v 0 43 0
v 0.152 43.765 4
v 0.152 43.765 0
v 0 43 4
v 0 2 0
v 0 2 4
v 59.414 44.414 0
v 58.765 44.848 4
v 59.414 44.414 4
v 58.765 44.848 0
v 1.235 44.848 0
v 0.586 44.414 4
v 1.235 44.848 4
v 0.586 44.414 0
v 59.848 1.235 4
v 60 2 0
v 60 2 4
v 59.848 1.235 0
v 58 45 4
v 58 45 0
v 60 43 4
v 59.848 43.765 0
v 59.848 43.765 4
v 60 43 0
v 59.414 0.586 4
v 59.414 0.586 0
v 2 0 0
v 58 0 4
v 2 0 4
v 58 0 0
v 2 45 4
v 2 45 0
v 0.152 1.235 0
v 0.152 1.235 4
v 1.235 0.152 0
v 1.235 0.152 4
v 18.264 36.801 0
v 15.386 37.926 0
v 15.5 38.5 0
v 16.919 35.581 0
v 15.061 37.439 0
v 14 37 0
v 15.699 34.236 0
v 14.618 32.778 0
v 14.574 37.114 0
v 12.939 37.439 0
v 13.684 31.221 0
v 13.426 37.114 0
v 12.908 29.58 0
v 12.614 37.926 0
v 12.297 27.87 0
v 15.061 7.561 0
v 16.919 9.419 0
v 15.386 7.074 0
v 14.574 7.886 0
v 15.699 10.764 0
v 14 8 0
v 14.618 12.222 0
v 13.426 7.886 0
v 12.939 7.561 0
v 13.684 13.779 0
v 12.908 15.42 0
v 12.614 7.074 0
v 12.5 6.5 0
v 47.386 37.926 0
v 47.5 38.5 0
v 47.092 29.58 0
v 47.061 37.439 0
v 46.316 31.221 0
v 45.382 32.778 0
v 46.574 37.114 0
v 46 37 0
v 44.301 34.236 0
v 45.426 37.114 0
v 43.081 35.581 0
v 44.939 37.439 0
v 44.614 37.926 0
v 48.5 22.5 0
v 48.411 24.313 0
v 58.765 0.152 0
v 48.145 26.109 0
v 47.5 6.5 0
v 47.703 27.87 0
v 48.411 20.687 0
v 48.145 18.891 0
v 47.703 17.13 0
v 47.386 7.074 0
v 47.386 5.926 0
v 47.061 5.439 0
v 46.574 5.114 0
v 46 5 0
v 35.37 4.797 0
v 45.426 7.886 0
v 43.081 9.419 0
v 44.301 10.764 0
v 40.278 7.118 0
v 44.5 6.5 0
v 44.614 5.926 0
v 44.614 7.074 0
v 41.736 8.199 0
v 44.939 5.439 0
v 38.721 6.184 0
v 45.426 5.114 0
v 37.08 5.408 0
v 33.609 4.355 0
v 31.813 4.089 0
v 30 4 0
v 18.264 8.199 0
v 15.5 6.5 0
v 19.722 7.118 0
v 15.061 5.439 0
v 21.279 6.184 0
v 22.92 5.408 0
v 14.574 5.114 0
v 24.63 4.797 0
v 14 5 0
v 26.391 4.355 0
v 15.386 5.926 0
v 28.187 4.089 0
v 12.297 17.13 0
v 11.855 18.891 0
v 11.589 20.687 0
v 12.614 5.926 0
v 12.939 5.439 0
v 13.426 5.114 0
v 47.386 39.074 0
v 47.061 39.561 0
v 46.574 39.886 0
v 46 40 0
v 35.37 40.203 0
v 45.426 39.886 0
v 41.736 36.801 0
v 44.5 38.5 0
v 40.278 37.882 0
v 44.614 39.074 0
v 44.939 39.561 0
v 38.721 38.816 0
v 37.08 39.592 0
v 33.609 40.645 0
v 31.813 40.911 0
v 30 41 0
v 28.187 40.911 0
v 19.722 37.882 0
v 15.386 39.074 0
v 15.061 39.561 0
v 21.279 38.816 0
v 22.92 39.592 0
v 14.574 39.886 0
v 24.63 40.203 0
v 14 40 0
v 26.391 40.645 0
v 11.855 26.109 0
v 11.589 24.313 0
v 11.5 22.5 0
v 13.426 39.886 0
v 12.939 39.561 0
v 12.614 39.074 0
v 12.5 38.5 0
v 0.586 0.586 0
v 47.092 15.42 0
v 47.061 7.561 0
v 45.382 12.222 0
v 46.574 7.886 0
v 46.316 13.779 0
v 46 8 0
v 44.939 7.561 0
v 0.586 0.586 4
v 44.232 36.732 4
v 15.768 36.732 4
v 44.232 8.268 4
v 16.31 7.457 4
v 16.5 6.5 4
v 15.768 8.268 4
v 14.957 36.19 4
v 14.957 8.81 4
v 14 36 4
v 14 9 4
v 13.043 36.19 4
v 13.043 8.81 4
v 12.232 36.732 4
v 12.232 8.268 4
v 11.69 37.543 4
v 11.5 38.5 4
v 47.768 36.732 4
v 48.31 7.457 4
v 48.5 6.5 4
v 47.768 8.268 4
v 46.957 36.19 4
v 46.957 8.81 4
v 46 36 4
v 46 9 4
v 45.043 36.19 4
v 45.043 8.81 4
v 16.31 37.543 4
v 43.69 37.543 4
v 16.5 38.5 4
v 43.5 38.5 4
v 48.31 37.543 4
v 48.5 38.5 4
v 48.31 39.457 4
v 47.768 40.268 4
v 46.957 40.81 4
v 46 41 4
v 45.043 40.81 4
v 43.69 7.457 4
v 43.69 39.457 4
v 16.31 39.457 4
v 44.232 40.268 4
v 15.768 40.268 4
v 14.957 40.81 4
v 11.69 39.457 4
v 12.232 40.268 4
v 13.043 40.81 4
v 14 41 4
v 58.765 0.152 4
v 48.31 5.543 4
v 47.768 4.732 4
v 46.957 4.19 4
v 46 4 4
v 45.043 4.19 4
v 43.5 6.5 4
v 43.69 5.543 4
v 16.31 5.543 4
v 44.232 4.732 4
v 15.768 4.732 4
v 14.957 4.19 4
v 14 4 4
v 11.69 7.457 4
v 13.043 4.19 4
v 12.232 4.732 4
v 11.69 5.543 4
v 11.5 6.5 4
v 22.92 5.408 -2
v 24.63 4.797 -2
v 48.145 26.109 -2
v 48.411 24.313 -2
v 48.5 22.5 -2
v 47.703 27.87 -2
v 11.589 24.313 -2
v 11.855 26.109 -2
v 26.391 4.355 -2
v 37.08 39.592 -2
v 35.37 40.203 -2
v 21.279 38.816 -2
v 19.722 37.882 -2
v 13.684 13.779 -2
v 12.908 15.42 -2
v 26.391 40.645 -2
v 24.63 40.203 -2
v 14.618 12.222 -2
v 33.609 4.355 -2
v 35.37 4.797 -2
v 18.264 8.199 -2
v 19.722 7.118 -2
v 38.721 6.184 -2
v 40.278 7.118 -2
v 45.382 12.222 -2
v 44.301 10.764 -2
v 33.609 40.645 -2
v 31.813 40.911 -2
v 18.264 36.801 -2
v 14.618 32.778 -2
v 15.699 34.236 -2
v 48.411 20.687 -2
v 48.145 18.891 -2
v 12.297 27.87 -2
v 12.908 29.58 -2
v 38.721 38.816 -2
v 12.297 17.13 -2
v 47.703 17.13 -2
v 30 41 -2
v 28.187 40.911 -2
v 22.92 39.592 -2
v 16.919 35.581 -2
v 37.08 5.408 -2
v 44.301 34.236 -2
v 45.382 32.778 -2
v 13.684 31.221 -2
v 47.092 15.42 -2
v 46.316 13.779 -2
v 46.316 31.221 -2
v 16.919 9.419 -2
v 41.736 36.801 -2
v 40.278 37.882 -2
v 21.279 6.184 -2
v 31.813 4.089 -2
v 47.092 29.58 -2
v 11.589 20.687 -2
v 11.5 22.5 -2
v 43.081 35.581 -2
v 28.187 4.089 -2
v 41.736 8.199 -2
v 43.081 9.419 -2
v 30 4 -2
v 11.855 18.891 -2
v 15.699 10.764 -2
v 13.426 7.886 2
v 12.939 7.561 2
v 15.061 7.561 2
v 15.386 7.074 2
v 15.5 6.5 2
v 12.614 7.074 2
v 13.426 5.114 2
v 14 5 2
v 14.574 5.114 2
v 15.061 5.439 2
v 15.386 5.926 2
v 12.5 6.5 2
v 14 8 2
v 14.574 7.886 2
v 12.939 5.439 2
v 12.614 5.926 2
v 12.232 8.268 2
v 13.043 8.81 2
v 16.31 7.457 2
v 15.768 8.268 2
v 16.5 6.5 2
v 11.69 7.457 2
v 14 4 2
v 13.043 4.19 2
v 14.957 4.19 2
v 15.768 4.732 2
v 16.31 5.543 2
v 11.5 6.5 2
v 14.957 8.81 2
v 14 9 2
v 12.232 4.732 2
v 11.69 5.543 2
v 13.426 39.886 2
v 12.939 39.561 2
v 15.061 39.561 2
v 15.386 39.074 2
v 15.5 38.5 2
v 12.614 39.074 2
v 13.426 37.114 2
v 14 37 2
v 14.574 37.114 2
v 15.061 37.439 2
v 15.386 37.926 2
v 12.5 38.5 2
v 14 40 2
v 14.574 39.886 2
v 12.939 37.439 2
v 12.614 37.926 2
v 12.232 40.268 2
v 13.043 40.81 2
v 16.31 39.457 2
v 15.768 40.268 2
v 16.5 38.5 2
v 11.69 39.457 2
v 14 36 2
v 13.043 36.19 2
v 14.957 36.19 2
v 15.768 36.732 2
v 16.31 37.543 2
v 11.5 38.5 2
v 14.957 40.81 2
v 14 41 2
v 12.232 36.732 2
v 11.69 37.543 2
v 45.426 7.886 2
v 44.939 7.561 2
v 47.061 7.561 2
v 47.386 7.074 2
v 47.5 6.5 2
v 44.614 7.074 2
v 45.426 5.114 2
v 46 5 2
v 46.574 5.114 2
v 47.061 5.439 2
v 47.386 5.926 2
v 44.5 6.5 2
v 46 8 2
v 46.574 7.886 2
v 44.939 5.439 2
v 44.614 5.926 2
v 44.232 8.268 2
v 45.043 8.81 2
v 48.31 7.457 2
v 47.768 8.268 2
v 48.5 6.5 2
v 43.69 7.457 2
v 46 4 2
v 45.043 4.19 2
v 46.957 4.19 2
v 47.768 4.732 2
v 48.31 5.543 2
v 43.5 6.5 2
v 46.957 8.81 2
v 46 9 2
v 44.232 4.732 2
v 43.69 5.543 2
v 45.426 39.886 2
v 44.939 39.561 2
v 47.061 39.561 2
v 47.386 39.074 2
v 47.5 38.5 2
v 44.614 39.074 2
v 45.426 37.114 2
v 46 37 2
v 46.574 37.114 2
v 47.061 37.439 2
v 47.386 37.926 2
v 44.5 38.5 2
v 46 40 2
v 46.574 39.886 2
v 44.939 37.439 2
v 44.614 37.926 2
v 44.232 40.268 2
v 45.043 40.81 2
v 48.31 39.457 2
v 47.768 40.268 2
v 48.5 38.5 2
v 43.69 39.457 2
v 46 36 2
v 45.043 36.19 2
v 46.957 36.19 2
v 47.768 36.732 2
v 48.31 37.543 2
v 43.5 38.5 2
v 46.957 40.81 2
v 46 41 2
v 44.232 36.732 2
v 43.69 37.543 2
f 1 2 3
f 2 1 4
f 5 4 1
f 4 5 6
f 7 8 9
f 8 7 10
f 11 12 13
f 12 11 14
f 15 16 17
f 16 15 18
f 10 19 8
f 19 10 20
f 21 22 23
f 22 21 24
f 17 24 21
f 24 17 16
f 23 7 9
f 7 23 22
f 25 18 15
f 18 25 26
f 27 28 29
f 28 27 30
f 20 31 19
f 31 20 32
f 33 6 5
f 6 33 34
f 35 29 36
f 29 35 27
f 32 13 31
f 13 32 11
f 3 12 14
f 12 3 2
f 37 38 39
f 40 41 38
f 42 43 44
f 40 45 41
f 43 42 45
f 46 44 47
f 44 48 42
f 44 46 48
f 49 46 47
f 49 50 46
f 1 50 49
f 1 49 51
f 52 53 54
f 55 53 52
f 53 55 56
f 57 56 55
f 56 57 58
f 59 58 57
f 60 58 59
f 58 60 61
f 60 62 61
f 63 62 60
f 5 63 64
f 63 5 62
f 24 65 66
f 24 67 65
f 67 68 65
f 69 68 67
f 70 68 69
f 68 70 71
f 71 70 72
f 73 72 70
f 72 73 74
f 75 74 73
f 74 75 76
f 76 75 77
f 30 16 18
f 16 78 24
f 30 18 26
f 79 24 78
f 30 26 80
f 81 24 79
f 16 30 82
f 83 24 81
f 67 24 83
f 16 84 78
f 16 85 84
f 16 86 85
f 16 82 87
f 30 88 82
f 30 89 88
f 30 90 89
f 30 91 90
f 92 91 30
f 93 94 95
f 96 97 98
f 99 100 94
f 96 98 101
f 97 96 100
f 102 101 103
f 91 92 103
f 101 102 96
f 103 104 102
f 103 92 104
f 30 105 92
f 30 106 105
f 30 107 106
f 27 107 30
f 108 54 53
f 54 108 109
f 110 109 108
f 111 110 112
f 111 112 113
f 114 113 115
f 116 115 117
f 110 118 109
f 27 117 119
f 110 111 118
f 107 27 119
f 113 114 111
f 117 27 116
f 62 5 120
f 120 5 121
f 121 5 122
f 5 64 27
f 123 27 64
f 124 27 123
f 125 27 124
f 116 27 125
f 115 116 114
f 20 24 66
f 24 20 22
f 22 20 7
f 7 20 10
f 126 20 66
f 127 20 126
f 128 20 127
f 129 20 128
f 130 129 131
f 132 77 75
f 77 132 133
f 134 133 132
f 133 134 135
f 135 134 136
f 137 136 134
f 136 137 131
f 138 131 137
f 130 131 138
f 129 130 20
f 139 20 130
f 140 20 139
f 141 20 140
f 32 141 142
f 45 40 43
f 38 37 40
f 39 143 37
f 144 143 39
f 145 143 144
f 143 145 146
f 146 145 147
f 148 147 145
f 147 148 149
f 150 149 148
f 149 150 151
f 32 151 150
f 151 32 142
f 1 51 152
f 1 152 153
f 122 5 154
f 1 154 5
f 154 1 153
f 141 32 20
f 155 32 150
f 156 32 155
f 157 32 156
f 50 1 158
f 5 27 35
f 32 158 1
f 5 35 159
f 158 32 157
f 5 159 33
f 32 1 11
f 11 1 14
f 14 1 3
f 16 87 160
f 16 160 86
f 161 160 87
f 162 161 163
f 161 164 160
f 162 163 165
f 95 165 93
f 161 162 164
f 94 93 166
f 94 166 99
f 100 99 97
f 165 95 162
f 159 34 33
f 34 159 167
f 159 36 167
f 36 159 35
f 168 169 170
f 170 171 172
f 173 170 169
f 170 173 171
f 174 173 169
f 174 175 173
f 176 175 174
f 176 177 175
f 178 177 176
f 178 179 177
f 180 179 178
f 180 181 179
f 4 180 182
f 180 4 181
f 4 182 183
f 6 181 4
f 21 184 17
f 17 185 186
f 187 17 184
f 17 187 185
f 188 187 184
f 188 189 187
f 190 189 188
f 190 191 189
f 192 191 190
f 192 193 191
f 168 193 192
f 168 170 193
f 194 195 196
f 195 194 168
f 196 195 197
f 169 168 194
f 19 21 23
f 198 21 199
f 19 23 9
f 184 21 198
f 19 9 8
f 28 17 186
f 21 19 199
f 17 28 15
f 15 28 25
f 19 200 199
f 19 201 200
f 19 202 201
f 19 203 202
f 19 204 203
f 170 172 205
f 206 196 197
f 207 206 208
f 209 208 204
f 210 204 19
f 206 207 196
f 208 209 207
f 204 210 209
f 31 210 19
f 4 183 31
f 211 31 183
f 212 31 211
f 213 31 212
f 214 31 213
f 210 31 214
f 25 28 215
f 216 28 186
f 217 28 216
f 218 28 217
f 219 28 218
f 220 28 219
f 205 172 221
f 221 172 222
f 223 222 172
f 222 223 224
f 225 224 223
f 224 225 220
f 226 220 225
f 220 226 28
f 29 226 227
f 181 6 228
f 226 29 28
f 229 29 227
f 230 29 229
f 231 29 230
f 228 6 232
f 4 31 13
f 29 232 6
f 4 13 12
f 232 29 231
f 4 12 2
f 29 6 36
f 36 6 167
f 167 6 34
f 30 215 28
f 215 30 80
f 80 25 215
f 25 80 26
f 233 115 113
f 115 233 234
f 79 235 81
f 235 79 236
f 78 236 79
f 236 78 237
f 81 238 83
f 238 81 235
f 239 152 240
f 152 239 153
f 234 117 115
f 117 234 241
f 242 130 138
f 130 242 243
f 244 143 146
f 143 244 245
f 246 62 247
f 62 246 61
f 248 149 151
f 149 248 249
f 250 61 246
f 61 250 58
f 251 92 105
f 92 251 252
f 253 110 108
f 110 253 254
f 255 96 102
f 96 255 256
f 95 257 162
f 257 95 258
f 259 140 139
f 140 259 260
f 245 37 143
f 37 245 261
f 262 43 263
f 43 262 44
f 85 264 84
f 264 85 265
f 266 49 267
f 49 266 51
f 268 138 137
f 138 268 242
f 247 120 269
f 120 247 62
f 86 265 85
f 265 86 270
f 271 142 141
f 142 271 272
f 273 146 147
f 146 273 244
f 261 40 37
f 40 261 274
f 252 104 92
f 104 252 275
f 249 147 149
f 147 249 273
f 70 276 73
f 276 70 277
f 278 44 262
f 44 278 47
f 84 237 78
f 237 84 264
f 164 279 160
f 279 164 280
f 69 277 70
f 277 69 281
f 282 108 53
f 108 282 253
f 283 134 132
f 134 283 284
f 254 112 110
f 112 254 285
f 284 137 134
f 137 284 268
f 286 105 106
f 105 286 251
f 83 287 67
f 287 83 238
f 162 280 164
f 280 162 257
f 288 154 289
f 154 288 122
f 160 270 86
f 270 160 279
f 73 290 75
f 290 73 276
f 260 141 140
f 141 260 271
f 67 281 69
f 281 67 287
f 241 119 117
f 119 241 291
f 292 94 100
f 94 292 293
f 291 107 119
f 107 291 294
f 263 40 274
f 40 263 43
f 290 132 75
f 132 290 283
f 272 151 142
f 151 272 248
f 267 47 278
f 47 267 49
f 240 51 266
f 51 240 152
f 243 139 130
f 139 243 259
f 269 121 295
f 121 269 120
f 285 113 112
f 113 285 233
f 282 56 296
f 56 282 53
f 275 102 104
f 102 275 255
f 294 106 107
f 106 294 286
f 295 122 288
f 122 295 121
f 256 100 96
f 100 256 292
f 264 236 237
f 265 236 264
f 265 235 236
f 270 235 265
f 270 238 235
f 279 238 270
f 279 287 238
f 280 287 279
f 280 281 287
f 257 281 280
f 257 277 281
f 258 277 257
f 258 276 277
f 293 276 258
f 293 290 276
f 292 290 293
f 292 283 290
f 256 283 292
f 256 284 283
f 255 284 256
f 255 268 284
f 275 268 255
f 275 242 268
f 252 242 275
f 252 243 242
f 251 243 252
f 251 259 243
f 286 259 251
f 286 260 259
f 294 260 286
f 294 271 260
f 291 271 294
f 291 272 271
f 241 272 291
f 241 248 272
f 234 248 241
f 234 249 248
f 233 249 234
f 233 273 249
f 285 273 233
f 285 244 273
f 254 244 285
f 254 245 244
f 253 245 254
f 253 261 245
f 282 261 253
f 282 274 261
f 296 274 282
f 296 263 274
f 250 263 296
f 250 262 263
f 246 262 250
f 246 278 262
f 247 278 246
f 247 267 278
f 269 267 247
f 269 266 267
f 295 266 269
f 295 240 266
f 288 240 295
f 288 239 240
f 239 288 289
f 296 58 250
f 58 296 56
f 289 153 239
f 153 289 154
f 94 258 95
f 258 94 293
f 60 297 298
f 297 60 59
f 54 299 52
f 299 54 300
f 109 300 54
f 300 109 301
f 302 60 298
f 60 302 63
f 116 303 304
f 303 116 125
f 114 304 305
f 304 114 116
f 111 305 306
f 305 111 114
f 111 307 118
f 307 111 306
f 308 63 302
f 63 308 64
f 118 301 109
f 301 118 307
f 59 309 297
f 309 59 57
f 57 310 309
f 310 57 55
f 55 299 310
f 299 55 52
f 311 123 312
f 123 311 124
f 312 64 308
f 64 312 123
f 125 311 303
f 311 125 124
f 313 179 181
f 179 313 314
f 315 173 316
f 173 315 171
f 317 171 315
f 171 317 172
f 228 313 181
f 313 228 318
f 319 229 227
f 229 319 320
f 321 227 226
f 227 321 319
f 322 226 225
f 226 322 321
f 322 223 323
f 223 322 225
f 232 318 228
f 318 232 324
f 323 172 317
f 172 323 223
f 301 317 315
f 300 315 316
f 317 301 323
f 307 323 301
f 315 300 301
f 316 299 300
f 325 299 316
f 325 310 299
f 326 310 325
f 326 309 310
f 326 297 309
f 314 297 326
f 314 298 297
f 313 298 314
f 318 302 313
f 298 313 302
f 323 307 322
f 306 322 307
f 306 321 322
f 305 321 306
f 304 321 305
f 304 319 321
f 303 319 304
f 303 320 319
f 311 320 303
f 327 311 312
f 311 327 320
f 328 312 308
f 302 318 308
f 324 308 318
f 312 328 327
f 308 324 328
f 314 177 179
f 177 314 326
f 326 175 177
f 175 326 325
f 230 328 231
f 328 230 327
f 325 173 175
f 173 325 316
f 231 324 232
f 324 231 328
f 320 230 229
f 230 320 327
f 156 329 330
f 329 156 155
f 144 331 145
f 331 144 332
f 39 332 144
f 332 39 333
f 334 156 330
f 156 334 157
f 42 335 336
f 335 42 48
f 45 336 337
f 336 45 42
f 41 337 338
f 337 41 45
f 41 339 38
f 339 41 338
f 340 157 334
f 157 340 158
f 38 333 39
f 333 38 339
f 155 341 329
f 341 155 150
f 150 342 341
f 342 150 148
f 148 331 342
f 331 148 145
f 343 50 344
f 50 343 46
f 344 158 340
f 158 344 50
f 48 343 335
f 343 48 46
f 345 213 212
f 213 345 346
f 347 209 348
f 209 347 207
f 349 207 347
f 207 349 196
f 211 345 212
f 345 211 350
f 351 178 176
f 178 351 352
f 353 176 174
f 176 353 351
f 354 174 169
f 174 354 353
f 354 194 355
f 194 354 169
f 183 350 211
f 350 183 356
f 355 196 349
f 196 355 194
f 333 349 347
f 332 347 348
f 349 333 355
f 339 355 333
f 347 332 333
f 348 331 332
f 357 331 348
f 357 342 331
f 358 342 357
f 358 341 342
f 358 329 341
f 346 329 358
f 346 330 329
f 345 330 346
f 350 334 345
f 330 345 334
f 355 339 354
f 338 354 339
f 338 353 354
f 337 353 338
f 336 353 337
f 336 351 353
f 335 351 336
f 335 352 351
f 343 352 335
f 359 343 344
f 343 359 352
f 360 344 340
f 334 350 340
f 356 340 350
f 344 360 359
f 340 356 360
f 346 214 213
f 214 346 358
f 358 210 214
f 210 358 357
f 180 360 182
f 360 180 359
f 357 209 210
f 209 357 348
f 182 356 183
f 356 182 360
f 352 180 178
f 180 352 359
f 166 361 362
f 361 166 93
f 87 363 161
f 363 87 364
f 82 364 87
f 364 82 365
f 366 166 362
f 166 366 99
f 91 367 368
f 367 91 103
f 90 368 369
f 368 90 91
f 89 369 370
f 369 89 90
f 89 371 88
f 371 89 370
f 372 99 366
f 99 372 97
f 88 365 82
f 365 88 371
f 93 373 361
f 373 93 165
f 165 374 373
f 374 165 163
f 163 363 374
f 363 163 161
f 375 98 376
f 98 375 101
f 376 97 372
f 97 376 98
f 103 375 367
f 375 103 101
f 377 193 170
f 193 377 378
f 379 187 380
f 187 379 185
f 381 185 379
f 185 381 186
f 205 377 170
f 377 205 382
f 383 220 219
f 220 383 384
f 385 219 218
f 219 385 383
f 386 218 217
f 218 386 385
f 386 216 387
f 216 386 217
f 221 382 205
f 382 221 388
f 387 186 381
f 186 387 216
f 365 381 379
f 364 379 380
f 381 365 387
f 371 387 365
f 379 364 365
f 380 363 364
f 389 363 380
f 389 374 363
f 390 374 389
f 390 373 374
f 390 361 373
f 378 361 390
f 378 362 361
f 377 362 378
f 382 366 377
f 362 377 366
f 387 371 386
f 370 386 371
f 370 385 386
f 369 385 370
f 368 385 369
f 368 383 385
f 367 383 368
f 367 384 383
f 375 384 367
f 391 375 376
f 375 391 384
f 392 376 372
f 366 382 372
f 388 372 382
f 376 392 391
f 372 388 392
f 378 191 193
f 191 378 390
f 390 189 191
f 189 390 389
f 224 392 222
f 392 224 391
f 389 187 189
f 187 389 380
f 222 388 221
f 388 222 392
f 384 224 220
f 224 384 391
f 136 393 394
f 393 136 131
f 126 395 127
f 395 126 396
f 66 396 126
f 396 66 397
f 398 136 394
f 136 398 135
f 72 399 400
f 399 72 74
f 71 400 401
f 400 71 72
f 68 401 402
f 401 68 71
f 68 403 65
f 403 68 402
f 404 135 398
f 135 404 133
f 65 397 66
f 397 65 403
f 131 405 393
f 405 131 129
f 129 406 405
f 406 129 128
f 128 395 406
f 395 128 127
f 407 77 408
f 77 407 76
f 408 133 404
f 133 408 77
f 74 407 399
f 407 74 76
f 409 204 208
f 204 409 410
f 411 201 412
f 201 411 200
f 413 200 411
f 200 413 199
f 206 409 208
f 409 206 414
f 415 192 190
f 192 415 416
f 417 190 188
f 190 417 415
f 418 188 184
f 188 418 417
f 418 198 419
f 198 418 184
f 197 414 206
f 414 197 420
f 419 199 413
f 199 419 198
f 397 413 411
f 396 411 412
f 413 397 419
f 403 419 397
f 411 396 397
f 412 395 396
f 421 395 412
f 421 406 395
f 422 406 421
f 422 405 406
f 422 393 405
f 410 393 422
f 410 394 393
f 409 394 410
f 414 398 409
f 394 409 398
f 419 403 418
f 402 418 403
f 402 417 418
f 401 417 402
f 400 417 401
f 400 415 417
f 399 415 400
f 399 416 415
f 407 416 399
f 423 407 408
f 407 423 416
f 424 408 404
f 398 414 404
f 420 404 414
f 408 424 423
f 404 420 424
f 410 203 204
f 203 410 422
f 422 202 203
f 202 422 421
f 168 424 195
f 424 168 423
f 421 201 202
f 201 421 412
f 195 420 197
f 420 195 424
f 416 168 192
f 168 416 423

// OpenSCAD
$fn= 16;

module plate() {
    translate([2, 2, 0])
    minkowski() {
        cube([56, 41, 2]);
        cylinder(r=2, h=2);
    };
    translate([30, 22.5, 0])
    cylinder($fn=64, r=18.5, h=4, center=true);
};

module screwhole() {
    cylinder(r=1.5, h=20, center=true);
    translate([0, 0, 4]) cylinder(r=2.5, h=4, center=true);
};

module base() {
    difference() {
        plate();
        translate([14, 6.5, 0]) screwhole();
        translate([14, 38.5, 0]) screwhole();
        translate([46, 6.5, 0]) screwhole();
        translate([46, 38.5, 0]) screwhole();
    };
};

// difference() {
//     base();
//     translate([7.25, 9.5, -3]) cube([45.5, 26, 8]);
//     translate([6, 8, 1.5]) cube([48, 29, 8]);
//     translate([18.5, 8.5, -3]) cube([23, 28, 8]);
// }

base ();
